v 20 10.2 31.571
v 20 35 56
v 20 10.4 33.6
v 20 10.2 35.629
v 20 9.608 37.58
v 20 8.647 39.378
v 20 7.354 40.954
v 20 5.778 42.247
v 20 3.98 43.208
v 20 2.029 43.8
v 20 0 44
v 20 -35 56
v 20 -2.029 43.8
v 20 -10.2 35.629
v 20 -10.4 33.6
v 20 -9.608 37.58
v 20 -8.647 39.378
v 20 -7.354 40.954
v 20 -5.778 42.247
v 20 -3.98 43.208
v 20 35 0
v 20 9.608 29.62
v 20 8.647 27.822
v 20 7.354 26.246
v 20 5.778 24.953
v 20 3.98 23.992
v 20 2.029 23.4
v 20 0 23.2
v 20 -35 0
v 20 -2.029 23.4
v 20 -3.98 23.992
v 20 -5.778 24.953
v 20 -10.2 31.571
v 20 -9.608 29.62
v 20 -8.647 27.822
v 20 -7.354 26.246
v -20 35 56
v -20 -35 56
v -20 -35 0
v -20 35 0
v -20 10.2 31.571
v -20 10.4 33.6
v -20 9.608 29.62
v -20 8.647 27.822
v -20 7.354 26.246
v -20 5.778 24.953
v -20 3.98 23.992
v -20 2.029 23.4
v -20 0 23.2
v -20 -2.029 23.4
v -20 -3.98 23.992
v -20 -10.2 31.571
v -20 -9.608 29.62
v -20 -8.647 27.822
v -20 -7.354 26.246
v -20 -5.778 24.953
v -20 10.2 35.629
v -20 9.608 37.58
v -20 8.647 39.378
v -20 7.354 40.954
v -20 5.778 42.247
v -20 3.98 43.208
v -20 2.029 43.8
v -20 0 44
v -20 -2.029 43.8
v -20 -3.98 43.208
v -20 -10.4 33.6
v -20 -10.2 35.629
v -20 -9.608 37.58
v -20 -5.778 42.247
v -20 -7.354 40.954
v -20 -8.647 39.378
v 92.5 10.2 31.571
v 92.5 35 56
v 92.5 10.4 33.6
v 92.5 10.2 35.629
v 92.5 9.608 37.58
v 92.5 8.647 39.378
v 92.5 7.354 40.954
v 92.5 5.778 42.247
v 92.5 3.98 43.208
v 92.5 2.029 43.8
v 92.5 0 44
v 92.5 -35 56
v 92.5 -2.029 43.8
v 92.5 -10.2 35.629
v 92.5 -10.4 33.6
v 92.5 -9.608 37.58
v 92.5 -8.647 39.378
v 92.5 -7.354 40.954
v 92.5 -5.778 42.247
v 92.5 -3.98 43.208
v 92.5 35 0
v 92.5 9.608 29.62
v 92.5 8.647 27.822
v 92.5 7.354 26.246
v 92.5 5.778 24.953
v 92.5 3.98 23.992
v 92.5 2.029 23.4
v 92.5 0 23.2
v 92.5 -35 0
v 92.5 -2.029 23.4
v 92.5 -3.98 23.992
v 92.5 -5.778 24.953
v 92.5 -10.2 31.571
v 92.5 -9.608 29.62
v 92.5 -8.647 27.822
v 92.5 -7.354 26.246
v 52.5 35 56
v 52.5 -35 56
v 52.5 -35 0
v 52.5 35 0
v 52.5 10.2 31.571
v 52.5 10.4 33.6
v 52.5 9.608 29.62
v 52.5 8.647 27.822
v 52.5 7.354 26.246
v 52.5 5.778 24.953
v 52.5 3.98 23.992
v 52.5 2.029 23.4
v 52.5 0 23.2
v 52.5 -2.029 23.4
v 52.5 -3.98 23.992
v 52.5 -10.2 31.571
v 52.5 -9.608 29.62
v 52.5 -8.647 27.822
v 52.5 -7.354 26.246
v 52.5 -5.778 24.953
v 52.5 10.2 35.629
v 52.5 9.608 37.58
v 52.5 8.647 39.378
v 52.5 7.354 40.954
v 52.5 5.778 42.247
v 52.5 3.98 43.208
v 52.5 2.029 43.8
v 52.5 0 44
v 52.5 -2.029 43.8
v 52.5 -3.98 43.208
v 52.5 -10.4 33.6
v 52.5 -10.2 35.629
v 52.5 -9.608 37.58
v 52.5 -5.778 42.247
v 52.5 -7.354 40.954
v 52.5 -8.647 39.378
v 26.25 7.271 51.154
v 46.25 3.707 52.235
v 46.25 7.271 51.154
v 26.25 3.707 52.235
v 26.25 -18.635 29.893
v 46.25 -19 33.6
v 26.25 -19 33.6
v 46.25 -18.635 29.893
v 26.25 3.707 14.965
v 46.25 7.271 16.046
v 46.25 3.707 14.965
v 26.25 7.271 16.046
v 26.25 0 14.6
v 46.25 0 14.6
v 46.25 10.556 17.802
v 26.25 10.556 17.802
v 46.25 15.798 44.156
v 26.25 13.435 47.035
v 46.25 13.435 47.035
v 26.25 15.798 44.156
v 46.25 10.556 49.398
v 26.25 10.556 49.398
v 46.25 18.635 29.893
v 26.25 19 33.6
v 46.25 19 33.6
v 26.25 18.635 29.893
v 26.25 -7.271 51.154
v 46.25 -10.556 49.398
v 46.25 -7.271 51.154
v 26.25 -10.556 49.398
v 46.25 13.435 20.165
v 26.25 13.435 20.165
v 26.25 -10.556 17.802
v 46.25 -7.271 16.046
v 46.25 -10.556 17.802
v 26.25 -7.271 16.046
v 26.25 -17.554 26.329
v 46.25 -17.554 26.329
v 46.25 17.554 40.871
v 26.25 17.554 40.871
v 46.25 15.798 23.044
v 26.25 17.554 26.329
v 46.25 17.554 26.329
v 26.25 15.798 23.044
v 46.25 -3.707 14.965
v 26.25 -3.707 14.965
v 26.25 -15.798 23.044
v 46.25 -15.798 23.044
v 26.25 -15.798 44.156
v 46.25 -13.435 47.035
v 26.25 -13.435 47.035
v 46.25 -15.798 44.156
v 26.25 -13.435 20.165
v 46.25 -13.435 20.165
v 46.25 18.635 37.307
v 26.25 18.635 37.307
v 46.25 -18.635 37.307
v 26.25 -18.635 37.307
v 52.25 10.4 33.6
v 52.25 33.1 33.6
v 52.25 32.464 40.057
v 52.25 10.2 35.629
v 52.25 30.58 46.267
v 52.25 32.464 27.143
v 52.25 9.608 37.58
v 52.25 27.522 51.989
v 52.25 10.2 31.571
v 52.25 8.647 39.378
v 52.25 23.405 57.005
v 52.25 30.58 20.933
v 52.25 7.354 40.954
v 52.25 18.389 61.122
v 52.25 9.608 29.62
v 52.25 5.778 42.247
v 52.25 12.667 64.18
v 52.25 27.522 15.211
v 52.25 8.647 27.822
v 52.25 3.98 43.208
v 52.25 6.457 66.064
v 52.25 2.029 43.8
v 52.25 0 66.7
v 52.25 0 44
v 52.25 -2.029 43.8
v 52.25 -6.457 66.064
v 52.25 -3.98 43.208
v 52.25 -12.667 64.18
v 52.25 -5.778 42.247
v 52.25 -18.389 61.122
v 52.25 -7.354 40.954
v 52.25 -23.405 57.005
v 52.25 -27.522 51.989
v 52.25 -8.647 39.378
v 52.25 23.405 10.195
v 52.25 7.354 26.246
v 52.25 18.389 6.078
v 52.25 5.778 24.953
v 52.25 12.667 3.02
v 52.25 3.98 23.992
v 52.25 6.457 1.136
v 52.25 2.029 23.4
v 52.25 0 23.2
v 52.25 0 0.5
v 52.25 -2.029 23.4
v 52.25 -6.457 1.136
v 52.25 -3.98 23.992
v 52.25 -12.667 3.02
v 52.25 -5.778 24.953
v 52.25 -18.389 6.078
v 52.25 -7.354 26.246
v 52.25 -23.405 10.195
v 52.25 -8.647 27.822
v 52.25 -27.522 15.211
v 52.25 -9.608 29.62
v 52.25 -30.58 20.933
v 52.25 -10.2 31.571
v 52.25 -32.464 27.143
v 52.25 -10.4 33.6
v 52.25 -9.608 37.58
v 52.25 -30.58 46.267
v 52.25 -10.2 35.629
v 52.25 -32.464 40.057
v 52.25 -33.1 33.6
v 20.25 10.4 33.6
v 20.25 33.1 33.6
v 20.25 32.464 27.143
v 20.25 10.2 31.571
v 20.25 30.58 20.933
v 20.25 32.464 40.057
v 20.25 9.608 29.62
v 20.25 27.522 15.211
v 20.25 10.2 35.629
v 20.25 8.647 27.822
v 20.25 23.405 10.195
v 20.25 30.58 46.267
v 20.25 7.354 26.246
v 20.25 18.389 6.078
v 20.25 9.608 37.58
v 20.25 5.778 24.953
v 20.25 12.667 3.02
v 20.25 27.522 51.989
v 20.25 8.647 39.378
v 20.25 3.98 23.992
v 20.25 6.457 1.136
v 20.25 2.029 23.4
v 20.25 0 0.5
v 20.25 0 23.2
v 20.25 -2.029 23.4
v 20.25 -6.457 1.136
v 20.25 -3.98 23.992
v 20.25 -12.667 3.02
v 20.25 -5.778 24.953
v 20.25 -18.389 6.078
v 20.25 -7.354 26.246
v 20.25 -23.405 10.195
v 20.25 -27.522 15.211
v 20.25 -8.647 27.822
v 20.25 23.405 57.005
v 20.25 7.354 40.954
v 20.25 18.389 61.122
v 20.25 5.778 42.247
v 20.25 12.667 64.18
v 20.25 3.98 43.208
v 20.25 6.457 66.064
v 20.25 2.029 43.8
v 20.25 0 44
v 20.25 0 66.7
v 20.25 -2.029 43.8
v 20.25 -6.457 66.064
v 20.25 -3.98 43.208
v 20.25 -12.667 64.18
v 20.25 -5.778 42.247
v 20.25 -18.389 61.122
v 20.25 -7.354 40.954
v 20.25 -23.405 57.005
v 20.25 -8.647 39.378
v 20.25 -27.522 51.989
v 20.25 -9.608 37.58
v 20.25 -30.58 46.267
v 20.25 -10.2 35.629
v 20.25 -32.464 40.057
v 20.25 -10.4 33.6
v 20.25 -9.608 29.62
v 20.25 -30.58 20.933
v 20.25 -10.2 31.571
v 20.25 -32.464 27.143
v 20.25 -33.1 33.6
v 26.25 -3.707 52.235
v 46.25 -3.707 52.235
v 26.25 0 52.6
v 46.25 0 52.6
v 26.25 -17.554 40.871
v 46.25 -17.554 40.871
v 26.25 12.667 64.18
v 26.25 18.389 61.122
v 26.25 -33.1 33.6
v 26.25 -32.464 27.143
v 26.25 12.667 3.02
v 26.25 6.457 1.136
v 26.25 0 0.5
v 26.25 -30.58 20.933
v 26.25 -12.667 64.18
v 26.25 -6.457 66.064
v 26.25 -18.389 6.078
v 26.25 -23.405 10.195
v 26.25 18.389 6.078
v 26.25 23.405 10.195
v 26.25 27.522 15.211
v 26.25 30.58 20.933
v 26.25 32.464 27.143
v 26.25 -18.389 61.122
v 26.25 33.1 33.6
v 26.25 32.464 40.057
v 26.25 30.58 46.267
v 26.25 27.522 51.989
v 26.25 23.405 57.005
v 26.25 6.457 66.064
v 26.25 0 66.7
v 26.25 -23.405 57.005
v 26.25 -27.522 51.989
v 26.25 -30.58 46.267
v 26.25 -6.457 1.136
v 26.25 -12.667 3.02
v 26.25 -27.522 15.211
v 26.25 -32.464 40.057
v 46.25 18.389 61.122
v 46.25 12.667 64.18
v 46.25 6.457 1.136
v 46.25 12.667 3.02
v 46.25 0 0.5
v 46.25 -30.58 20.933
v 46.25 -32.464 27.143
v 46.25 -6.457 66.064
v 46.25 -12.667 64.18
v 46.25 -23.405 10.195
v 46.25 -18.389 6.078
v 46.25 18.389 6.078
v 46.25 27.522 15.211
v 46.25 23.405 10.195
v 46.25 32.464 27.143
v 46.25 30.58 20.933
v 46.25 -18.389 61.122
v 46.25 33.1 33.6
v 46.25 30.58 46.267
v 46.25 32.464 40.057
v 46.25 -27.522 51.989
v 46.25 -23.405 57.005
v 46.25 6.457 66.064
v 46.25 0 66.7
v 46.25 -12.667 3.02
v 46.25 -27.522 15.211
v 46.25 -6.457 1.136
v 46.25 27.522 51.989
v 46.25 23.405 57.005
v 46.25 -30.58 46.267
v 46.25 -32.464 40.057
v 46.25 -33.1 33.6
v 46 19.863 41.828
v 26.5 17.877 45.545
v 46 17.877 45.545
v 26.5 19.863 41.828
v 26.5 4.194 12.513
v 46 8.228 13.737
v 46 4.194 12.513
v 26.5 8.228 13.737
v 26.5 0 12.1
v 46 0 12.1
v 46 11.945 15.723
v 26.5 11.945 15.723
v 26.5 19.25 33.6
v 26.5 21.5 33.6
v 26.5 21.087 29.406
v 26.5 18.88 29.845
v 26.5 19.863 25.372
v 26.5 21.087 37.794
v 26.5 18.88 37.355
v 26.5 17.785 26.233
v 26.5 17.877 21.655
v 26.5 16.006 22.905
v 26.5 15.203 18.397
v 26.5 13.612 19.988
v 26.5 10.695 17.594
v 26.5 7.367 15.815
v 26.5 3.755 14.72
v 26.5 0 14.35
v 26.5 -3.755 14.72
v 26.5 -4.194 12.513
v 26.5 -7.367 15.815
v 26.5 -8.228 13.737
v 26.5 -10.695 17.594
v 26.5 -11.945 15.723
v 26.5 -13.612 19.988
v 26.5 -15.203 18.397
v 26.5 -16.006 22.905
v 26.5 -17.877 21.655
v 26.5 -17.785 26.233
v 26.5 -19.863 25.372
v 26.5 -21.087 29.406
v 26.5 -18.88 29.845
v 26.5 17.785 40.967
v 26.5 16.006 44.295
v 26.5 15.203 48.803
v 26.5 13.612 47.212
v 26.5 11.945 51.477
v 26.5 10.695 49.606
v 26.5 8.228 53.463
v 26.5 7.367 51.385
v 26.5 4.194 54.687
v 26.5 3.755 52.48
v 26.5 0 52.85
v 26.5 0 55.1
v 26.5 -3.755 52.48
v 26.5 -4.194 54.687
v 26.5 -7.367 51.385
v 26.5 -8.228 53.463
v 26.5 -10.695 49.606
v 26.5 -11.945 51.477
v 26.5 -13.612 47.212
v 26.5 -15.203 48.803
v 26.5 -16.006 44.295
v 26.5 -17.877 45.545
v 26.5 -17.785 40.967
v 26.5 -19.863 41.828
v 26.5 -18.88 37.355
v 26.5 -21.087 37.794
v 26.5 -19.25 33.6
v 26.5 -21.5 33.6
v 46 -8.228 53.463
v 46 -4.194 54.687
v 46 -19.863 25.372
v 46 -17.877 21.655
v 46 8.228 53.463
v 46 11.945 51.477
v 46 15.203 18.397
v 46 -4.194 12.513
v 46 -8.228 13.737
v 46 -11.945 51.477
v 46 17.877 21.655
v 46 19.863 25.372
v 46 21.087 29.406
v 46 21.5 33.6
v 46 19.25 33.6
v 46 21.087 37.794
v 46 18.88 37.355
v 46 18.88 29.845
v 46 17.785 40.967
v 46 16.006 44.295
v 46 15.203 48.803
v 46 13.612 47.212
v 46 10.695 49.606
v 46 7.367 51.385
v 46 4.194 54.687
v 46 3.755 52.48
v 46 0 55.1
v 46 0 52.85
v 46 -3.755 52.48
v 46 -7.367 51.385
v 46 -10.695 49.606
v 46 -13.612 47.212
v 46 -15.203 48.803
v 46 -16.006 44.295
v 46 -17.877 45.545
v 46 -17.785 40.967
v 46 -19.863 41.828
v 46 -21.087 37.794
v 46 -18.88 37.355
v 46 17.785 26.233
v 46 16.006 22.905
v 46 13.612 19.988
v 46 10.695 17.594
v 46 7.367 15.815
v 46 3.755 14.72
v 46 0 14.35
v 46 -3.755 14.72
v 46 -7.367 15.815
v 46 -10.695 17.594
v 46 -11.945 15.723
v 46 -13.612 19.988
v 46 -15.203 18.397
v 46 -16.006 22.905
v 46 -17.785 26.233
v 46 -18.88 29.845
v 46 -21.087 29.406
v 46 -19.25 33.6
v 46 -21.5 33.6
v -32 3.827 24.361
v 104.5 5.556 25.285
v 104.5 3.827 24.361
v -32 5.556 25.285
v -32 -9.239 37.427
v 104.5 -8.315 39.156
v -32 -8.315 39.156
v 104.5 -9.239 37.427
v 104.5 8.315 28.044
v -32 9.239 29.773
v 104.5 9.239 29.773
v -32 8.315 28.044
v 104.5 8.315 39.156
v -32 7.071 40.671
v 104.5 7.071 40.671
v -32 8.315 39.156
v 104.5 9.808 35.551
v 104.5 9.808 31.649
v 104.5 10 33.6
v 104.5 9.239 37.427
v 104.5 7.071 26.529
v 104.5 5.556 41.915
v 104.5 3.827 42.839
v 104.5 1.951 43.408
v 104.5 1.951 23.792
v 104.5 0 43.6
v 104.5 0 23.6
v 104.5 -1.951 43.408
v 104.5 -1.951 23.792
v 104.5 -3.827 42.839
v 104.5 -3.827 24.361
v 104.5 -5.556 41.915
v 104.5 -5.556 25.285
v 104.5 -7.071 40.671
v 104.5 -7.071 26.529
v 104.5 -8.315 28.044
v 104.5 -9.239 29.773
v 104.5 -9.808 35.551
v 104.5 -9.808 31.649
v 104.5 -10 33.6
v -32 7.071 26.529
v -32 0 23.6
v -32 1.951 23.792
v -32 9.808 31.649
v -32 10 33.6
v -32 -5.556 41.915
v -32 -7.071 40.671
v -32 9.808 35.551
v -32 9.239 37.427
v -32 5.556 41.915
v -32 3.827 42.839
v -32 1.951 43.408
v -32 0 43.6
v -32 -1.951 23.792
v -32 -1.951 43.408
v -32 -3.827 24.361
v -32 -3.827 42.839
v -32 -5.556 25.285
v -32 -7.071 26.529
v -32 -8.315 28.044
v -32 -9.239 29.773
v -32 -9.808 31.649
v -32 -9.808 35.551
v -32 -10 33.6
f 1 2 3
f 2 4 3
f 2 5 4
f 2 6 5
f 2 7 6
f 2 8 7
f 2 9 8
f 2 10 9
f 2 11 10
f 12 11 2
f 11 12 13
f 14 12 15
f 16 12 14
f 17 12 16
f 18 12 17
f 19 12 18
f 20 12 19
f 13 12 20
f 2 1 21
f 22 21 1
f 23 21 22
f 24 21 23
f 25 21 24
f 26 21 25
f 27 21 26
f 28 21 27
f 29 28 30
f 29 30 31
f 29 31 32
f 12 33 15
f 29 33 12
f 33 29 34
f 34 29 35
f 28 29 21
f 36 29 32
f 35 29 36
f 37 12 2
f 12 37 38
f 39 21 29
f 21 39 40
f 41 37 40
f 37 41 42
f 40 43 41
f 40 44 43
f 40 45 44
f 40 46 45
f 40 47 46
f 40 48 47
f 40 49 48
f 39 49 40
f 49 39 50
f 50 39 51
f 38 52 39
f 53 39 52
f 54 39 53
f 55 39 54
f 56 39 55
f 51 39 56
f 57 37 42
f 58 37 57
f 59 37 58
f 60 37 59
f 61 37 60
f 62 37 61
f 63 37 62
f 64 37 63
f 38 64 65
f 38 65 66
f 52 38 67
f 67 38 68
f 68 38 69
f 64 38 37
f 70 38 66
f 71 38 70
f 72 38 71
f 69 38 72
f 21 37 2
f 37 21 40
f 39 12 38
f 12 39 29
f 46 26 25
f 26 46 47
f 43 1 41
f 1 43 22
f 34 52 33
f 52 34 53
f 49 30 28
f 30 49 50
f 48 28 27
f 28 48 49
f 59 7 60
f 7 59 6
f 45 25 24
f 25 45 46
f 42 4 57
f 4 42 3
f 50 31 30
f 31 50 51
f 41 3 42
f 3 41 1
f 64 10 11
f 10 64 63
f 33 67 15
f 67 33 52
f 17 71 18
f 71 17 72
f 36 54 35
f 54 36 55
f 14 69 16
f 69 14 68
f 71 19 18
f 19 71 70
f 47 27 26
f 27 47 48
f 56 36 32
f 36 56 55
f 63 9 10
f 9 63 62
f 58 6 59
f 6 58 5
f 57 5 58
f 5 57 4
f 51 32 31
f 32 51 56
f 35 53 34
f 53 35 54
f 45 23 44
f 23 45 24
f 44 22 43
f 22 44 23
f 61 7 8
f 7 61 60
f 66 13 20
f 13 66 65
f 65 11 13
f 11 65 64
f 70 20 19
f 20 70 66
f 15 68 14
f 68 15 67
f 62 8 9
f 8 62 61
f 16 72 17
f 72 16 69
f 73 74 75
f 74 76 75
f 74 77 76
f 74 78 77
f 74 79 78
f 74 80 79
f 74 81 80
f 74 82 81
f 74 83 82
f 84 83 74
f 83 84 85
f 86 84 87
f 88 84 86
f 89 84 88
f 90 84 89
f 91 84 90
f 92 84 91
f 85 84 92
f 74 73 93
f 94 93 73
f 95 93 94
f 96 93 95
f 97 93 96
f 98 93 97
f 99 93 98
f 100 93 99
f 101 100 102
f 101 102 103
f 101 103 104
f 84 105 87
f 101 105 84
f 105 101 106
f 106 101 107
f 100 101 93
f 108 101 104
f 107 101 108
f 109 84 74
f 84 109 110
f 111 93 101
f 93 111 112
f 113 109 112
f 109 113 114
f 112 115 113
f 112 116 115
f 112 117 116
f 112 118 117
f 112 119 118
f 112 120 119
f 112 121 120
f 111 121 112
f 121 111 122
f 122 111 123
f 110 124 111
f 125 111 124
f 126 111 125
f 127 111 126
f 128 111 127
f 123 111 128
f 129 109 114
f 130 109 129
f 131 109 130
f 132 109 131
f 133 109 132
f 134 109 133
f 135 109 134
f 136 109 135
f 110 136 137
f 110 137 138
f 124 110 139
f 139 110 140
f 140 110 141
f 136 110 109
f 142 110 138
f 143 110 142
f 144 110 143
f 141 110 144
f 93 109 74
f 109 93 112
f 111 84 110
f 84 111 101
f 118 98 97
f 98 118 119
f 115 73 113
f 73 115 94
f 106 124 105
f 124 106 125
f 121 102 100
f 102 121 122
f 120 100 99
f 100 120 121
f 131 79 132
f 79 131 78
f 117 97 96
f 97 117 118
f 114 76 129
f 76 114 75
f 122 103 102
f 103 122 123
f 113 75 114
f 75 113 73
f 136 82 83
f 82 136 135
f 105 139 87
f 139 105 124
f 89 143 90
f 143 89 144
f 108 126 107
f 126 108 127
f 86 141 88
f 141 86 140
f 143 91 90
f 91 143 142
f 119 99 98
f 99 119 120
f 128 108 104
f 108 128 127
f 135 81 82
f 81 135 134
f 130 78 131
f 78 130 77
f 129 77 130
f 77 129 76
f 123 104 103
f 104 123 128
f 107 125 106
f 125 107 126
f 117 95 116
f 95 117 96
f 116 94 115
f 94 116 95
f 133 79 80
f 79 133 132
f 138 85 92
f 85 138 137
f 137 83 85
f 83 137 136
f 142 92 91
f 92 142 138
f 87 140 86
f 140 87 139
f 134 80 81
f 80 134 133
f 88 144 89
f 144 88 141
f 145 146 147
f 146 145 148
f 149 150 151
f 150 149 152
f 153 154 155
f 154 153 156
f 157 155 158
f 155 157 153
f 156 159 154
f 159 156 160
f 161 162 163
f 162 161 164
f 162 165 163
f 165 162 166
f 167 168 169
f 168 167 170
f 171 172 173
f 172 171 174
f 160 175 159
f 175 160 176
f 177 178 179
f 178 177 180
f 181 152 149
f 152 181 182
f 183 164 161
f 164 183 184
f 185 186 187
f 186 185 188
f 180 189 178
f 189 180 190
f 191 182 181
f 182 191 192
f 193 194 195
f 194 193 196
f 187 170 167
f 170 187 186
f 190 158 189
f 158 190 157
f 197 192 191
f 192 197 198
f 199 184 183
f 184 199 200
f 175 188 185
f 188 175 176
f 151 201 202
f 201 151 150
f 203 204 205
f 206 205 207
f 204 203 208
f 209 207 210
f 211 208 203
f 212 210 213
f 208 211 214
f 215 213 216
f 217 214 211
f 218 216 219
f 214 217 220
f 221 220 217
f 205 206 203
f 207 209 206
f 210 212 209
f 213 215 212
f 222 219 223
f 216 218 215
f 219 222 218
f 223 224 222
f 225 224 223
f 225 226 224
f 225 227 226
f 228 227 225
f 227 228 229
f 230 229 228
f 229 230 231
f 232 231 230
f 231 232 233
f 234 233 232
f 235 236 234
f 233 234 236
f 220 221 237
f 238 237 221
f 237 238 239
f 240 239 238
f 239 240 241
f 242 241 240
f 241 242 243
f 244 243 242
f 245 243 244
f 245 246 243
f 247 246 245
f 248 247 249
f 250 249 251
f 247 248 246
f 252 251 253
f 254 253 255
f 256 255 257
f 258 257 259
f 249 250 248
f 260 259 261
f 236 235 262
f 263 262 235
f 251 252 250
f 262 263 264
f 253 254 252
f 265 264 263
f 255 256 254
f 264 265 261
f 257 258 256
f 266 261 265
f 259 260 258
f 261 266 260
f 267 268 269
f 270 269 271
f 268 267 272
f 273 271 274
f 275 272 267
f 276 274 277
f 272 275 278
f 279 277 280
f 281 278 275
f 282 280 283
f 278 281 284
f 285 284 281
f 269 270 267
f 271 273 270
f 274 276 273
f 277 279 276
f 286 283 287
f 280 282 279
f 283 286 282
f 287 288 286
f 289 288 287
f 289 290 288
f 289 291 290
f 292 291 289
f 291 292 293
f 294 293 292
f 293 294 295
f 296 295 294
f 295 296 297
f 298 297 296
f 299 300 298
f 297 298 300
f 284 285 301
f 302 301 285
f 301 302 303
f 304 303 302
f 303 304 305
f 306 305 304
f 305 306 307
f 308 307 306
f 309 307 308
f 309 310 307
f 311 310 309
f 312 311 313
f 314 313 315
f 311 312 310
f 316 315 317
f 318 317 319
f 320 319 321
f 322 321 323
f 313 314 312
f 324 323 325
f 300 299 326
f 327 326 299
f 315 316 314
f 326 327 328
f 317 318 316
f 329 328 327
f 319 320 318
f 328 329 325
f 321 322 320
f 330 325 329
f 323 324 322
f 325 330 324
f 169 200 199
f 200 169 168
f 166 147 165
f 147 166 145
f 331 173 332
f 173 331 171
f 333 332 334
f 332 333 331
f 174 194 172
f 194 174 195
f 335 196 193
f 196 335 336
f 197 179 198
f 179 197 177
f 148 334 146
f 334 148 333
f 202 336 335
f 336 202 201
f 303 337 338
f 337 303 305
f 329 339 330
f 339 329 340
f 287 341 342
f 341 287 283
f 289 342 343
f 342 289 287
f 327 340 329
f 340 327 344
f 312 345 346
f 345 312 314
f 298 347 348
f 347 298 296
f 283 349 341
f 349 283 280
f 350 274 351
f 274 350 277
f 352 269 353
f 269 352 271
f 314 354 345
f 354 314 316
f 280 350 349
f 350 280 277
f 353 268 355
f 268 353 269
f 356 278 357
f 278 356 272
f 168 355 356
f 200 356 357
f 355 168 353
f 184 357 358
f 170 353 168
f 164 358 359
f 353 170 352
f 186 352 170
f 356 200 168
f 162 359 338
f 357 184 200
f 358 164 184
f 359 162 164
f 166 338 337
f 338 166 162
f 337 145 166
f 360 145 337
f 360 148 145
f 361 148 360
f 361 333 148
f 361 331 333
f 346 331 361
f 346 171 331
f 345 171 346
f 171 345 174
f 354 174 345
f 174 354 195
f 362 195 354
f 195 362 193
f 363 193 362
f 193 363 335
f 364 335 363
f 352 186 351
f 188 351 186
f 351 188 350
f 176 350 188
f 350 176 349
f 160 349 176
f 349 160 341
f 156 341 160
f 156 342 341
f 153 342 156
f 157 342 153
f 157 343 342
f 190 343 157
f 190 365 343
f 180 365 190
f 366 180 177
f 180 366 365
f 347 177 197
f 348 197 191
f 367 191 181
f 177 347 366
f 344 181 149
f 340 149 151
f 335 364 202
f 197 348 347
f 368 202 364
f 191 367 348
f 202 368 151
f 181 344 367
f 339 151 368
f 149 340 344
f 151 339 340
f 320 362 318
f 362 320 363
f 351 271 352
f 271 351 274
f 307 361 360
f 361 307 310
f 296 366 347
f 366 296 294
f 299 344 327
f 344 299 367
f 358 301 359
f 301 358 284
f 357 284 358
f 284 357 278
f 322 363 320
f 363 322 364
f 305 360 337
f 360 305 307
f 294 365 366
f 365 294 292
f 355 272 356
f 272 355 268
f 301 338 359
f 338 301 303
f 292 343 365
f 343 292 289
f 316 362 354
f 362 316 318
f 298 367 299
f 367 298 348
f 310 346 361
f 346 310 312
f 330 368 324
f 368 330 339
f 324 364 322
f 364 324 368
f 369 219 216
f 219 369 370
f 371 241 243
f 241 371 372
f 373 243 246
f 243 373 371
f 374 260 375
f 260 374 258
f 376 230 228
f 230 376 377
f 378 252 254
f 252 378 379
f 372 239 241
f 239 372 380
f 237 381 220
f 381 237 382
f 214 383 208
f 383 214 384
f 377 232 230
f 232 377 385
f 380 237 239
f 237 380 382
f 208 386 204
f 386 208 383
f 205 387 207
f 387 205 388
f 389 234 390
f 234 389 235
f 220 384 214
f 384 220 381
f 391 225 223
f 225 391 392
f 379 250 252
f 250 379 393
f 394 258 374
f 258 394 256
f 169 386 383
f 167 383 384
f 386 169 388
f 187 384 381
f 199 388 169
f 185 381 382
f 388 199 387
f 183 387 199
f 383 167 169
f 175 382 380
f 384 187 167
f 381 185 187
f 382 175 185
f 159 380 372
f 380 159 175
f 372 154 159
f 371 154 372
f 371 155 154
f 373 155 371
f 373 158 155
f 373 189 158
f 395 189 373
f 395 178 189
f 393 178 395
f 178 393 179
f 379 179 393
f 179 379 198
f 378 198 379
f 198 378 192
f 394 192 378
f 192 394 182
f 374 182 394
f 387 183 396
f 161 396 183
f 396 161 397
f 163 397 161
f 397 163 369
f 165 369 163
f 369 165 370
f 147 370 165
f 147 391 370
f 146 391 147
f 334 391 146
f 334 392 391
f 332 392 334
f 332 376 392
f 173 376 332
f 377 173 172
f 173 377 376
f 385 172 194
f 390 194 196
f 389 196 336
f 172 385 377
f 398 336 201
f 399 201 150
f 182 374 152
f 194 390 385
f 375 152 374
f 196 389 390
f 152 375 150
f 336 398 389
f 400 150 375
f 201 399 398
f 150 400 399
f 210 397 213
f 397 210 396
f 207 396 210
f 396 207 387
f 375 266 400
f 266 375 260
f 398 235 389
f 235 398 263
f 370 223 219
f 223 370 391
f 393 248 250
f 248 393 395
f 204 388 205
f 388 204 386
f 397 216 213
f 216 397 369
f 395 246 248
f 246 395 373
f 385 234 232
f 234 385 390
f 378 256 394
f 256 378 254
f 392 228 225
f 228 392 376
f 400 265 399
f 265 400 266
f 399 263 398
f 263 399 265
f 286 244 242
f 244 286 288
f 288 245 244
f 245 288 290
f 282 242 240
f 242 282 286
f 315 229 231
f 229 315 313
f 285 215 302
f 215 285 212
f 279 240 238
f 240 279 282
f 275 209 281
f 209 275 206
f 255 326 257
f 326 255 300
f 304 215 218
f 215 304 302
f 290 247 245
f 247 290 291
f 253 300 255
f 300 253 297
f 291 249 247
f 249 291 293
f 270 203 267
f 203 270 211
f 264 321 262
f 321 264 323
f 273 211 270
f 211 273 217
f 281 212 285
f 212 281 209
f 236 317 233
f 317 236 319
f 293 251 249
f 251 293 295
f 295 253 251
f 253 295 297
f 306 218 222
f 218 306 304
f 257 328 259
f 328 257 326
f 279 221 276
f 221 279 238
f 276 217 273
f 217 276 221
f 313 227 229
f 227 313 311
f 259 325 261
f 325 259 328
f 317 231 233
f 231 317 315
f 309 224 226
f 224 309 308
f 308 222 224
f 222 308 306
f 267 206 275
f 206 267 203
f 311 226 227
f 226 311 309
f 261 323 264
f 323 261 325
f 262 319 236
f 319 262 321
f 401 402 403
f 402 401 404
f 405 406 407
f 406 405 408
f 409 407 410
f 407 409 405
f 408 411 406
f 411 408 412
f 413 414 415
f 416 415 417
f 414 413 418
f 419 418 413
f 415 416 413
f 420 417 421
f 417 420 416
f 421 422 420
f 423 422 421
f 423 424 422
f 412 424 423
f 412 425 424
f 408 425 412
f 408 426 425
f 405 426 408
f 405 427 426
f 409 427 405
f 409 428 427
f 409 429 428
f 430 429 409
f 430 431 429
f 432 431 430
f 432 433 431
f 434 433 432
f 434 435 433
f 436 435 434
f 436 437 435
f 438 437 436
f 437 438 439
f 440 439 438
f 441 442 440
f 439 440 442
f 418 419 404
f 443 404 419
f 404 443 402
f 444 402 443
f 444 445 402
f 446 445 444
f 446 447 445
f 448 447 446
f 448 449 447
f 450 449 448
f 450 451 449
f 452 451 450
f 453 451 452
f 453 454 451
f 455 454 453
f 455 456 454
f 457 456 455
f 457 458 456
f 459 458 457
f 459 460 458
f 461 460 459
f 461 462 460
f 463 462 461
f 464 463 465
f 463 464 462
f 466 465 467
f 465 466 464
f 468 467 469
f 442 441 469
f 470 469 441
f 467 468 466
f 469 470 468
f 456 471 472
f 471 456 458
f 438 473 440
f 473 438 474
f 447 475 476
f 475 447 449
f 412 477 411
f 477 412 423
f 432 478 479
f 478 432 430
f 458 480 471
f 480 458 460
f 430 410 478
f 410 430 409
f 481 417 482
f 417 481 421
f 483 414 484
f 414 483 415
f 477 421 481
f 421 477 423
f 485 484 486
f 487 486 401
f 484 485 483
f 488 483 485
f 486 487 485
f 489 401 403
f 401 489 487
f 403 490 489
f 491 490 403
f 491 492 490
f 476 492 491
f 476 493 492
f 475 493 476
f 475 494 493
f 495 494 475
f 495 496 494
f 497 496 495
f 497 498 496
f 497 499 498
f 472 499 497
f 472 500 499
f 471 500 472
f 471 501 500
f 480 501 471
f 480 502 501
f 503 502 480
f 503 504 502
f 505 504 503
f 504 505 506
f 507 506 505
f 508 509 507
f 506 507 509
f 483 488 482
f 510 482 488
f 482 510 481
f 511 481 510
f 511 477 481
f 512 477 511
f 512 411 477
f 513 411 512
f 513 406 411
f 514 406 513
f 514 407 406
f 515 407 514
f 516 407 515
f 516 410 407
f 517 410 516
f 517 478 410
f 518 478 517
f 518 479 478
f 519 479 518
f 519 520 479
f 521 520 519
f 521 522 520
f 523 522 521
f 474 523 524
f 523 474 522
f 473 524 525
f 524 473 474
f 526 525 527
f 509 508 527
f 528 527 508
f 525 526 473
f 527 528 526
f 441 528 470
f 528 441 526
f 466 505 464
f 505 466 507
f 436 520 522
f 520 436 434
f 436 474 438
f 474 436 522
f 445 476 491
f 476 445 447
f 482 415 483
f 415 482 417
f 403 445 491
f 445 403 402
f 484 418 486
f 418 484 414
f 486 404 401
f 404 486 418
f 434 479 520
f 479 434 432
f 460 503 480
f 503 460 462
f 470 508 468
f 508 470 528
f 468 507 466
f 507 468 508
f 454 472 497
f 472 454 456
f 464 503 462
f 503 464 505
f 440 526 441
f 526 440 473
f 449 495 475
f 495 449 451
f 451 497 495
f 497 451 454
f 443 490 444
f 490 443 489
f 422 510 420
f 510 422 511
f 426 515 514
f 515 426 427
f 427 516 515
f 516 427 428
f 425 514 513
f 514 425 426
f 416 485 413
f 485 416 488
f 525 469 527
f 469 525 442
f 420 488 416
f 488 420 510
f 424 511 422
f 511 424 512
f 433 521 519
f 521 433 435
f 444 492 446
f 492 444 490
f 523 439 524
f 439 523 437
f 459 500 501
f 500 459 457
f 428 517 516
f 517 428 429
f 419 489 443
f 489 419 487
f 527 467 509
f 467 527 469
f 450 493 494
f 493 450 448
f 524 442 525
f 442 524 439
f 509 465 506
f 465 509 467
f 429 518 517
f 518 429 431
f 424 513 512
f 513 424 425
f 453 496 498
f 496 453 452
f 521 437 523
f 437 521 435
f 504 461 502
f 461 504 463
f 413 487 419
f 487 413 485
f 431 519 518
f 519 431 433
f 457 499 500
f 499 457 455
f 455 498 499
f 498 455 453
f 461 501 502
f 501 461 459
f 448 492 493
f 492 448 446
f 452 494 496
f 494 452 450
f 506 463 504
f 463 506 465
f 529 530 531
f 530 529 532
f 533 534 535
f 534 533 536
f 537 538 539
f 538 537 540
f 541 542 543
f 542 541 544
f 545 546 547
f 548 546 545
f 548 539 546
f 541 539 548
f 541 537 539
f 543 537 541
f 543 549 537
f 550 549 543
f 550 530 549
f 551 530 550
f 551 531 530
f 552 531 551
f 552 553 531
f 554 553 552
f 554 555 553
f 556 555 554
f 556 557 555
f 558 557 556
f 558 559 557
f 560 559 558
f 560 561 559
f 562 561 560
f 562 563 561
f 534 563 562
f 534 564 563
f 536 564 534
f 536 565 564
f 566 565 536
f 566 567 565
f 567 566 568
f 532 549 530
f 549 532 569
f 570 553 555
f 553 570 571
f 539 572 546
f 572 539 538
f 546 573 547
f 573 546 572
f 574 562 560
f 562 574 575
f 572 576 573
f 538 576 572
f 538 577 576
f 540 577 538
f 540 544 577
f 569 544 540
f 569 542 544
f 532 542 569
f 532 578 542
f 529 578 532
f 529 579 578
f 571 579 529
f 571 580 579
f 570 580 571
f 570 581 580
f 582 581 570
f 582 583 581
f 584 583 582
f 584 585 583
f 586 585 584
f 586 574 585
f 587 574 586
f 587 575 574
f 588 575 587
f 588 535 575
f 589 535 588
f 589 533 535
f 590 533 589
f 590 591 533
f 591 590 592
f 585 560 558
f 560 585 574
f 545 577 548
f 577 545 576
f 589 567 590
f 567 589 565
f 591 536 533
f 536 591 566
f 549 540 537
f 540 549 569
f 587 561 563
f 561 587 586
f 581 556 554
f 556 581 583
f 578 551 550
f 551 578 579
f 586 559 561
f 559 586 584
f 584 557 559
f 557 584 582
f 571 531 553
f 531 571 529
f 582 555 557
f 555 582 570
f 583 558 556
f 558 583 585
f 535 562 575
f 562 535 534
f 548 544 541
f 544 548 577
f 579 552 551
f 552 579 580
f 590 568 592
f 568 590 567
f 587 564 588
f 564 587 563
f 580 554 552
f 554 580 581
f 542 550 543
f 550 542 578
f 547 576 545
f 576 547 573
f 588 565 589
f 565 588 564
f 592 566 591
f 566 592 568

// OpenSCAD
$fn = 32;

// ------------------------------------------------------------------------
// Pulley assembly: d66.2 pulley with a belt, shaft d20
// Every part is its own module, assembly() places them once.
// ------------------------------------------------------------------------

// --- part 1 ---
module support1() {
  difference() {
    translate([-20, -35, 0]) cube([40, 70, 56]);
    translate([0, 0, 33.6]) rotate([0, 90, 0]) cylinder(h = 42, d = 20.8, center = true);
  }
}

// --- part 2 ---
module support2() {
  difference() {
    translate([-20, -35, 0]) cube([40, 70, 56]);
    translate([0, 0, 33.6]) rotate([0, 90, 0]) cylinder(h = 42, d = 20.8, center = true);
  }
}

// --- part 3 ---
module shaft() {
  translate([0, 0, -68.25]) cylinder(h = 136.5, d = 20);
}

// --- part 4 ---
module pulley() {
  difference() {
    union() {
      cylinder(h = 32, d = 38);
      cylinder(h = 6, d = 66.2);
      translate([0, 0, 26]) cylinder(h = 6, d = 66.2);
    }
    translate([0, 0, -1]) cylinder(h = 34, d = 20.8);
  }
}

// --- part 5 ---
module belt() {
  difference() {
      translate([0, 0, 0]) cylinder(h = 19.5, d = 43);
      translate([0, 0, -1]) cylinder(h = 21.5, d = 38.5);
    }
}

// --- assembly ---
module assembly() {
  translate([0, 0, 0]) rotate([0, 0, 0]) support1();
  translate([72.5, 0, 0]) rotate([0, 0, 0]) support2();
  translate([36.25, 0, 33.6]) rotate([0, 90, 0]) shaft();
  translate([20.25, 0, 33.6]) rotate([0, 90, 0]) pulley();
  translate([26.5, 0, 33.6]) rotate([0, 90, 0]) belt();
}

assembly();
